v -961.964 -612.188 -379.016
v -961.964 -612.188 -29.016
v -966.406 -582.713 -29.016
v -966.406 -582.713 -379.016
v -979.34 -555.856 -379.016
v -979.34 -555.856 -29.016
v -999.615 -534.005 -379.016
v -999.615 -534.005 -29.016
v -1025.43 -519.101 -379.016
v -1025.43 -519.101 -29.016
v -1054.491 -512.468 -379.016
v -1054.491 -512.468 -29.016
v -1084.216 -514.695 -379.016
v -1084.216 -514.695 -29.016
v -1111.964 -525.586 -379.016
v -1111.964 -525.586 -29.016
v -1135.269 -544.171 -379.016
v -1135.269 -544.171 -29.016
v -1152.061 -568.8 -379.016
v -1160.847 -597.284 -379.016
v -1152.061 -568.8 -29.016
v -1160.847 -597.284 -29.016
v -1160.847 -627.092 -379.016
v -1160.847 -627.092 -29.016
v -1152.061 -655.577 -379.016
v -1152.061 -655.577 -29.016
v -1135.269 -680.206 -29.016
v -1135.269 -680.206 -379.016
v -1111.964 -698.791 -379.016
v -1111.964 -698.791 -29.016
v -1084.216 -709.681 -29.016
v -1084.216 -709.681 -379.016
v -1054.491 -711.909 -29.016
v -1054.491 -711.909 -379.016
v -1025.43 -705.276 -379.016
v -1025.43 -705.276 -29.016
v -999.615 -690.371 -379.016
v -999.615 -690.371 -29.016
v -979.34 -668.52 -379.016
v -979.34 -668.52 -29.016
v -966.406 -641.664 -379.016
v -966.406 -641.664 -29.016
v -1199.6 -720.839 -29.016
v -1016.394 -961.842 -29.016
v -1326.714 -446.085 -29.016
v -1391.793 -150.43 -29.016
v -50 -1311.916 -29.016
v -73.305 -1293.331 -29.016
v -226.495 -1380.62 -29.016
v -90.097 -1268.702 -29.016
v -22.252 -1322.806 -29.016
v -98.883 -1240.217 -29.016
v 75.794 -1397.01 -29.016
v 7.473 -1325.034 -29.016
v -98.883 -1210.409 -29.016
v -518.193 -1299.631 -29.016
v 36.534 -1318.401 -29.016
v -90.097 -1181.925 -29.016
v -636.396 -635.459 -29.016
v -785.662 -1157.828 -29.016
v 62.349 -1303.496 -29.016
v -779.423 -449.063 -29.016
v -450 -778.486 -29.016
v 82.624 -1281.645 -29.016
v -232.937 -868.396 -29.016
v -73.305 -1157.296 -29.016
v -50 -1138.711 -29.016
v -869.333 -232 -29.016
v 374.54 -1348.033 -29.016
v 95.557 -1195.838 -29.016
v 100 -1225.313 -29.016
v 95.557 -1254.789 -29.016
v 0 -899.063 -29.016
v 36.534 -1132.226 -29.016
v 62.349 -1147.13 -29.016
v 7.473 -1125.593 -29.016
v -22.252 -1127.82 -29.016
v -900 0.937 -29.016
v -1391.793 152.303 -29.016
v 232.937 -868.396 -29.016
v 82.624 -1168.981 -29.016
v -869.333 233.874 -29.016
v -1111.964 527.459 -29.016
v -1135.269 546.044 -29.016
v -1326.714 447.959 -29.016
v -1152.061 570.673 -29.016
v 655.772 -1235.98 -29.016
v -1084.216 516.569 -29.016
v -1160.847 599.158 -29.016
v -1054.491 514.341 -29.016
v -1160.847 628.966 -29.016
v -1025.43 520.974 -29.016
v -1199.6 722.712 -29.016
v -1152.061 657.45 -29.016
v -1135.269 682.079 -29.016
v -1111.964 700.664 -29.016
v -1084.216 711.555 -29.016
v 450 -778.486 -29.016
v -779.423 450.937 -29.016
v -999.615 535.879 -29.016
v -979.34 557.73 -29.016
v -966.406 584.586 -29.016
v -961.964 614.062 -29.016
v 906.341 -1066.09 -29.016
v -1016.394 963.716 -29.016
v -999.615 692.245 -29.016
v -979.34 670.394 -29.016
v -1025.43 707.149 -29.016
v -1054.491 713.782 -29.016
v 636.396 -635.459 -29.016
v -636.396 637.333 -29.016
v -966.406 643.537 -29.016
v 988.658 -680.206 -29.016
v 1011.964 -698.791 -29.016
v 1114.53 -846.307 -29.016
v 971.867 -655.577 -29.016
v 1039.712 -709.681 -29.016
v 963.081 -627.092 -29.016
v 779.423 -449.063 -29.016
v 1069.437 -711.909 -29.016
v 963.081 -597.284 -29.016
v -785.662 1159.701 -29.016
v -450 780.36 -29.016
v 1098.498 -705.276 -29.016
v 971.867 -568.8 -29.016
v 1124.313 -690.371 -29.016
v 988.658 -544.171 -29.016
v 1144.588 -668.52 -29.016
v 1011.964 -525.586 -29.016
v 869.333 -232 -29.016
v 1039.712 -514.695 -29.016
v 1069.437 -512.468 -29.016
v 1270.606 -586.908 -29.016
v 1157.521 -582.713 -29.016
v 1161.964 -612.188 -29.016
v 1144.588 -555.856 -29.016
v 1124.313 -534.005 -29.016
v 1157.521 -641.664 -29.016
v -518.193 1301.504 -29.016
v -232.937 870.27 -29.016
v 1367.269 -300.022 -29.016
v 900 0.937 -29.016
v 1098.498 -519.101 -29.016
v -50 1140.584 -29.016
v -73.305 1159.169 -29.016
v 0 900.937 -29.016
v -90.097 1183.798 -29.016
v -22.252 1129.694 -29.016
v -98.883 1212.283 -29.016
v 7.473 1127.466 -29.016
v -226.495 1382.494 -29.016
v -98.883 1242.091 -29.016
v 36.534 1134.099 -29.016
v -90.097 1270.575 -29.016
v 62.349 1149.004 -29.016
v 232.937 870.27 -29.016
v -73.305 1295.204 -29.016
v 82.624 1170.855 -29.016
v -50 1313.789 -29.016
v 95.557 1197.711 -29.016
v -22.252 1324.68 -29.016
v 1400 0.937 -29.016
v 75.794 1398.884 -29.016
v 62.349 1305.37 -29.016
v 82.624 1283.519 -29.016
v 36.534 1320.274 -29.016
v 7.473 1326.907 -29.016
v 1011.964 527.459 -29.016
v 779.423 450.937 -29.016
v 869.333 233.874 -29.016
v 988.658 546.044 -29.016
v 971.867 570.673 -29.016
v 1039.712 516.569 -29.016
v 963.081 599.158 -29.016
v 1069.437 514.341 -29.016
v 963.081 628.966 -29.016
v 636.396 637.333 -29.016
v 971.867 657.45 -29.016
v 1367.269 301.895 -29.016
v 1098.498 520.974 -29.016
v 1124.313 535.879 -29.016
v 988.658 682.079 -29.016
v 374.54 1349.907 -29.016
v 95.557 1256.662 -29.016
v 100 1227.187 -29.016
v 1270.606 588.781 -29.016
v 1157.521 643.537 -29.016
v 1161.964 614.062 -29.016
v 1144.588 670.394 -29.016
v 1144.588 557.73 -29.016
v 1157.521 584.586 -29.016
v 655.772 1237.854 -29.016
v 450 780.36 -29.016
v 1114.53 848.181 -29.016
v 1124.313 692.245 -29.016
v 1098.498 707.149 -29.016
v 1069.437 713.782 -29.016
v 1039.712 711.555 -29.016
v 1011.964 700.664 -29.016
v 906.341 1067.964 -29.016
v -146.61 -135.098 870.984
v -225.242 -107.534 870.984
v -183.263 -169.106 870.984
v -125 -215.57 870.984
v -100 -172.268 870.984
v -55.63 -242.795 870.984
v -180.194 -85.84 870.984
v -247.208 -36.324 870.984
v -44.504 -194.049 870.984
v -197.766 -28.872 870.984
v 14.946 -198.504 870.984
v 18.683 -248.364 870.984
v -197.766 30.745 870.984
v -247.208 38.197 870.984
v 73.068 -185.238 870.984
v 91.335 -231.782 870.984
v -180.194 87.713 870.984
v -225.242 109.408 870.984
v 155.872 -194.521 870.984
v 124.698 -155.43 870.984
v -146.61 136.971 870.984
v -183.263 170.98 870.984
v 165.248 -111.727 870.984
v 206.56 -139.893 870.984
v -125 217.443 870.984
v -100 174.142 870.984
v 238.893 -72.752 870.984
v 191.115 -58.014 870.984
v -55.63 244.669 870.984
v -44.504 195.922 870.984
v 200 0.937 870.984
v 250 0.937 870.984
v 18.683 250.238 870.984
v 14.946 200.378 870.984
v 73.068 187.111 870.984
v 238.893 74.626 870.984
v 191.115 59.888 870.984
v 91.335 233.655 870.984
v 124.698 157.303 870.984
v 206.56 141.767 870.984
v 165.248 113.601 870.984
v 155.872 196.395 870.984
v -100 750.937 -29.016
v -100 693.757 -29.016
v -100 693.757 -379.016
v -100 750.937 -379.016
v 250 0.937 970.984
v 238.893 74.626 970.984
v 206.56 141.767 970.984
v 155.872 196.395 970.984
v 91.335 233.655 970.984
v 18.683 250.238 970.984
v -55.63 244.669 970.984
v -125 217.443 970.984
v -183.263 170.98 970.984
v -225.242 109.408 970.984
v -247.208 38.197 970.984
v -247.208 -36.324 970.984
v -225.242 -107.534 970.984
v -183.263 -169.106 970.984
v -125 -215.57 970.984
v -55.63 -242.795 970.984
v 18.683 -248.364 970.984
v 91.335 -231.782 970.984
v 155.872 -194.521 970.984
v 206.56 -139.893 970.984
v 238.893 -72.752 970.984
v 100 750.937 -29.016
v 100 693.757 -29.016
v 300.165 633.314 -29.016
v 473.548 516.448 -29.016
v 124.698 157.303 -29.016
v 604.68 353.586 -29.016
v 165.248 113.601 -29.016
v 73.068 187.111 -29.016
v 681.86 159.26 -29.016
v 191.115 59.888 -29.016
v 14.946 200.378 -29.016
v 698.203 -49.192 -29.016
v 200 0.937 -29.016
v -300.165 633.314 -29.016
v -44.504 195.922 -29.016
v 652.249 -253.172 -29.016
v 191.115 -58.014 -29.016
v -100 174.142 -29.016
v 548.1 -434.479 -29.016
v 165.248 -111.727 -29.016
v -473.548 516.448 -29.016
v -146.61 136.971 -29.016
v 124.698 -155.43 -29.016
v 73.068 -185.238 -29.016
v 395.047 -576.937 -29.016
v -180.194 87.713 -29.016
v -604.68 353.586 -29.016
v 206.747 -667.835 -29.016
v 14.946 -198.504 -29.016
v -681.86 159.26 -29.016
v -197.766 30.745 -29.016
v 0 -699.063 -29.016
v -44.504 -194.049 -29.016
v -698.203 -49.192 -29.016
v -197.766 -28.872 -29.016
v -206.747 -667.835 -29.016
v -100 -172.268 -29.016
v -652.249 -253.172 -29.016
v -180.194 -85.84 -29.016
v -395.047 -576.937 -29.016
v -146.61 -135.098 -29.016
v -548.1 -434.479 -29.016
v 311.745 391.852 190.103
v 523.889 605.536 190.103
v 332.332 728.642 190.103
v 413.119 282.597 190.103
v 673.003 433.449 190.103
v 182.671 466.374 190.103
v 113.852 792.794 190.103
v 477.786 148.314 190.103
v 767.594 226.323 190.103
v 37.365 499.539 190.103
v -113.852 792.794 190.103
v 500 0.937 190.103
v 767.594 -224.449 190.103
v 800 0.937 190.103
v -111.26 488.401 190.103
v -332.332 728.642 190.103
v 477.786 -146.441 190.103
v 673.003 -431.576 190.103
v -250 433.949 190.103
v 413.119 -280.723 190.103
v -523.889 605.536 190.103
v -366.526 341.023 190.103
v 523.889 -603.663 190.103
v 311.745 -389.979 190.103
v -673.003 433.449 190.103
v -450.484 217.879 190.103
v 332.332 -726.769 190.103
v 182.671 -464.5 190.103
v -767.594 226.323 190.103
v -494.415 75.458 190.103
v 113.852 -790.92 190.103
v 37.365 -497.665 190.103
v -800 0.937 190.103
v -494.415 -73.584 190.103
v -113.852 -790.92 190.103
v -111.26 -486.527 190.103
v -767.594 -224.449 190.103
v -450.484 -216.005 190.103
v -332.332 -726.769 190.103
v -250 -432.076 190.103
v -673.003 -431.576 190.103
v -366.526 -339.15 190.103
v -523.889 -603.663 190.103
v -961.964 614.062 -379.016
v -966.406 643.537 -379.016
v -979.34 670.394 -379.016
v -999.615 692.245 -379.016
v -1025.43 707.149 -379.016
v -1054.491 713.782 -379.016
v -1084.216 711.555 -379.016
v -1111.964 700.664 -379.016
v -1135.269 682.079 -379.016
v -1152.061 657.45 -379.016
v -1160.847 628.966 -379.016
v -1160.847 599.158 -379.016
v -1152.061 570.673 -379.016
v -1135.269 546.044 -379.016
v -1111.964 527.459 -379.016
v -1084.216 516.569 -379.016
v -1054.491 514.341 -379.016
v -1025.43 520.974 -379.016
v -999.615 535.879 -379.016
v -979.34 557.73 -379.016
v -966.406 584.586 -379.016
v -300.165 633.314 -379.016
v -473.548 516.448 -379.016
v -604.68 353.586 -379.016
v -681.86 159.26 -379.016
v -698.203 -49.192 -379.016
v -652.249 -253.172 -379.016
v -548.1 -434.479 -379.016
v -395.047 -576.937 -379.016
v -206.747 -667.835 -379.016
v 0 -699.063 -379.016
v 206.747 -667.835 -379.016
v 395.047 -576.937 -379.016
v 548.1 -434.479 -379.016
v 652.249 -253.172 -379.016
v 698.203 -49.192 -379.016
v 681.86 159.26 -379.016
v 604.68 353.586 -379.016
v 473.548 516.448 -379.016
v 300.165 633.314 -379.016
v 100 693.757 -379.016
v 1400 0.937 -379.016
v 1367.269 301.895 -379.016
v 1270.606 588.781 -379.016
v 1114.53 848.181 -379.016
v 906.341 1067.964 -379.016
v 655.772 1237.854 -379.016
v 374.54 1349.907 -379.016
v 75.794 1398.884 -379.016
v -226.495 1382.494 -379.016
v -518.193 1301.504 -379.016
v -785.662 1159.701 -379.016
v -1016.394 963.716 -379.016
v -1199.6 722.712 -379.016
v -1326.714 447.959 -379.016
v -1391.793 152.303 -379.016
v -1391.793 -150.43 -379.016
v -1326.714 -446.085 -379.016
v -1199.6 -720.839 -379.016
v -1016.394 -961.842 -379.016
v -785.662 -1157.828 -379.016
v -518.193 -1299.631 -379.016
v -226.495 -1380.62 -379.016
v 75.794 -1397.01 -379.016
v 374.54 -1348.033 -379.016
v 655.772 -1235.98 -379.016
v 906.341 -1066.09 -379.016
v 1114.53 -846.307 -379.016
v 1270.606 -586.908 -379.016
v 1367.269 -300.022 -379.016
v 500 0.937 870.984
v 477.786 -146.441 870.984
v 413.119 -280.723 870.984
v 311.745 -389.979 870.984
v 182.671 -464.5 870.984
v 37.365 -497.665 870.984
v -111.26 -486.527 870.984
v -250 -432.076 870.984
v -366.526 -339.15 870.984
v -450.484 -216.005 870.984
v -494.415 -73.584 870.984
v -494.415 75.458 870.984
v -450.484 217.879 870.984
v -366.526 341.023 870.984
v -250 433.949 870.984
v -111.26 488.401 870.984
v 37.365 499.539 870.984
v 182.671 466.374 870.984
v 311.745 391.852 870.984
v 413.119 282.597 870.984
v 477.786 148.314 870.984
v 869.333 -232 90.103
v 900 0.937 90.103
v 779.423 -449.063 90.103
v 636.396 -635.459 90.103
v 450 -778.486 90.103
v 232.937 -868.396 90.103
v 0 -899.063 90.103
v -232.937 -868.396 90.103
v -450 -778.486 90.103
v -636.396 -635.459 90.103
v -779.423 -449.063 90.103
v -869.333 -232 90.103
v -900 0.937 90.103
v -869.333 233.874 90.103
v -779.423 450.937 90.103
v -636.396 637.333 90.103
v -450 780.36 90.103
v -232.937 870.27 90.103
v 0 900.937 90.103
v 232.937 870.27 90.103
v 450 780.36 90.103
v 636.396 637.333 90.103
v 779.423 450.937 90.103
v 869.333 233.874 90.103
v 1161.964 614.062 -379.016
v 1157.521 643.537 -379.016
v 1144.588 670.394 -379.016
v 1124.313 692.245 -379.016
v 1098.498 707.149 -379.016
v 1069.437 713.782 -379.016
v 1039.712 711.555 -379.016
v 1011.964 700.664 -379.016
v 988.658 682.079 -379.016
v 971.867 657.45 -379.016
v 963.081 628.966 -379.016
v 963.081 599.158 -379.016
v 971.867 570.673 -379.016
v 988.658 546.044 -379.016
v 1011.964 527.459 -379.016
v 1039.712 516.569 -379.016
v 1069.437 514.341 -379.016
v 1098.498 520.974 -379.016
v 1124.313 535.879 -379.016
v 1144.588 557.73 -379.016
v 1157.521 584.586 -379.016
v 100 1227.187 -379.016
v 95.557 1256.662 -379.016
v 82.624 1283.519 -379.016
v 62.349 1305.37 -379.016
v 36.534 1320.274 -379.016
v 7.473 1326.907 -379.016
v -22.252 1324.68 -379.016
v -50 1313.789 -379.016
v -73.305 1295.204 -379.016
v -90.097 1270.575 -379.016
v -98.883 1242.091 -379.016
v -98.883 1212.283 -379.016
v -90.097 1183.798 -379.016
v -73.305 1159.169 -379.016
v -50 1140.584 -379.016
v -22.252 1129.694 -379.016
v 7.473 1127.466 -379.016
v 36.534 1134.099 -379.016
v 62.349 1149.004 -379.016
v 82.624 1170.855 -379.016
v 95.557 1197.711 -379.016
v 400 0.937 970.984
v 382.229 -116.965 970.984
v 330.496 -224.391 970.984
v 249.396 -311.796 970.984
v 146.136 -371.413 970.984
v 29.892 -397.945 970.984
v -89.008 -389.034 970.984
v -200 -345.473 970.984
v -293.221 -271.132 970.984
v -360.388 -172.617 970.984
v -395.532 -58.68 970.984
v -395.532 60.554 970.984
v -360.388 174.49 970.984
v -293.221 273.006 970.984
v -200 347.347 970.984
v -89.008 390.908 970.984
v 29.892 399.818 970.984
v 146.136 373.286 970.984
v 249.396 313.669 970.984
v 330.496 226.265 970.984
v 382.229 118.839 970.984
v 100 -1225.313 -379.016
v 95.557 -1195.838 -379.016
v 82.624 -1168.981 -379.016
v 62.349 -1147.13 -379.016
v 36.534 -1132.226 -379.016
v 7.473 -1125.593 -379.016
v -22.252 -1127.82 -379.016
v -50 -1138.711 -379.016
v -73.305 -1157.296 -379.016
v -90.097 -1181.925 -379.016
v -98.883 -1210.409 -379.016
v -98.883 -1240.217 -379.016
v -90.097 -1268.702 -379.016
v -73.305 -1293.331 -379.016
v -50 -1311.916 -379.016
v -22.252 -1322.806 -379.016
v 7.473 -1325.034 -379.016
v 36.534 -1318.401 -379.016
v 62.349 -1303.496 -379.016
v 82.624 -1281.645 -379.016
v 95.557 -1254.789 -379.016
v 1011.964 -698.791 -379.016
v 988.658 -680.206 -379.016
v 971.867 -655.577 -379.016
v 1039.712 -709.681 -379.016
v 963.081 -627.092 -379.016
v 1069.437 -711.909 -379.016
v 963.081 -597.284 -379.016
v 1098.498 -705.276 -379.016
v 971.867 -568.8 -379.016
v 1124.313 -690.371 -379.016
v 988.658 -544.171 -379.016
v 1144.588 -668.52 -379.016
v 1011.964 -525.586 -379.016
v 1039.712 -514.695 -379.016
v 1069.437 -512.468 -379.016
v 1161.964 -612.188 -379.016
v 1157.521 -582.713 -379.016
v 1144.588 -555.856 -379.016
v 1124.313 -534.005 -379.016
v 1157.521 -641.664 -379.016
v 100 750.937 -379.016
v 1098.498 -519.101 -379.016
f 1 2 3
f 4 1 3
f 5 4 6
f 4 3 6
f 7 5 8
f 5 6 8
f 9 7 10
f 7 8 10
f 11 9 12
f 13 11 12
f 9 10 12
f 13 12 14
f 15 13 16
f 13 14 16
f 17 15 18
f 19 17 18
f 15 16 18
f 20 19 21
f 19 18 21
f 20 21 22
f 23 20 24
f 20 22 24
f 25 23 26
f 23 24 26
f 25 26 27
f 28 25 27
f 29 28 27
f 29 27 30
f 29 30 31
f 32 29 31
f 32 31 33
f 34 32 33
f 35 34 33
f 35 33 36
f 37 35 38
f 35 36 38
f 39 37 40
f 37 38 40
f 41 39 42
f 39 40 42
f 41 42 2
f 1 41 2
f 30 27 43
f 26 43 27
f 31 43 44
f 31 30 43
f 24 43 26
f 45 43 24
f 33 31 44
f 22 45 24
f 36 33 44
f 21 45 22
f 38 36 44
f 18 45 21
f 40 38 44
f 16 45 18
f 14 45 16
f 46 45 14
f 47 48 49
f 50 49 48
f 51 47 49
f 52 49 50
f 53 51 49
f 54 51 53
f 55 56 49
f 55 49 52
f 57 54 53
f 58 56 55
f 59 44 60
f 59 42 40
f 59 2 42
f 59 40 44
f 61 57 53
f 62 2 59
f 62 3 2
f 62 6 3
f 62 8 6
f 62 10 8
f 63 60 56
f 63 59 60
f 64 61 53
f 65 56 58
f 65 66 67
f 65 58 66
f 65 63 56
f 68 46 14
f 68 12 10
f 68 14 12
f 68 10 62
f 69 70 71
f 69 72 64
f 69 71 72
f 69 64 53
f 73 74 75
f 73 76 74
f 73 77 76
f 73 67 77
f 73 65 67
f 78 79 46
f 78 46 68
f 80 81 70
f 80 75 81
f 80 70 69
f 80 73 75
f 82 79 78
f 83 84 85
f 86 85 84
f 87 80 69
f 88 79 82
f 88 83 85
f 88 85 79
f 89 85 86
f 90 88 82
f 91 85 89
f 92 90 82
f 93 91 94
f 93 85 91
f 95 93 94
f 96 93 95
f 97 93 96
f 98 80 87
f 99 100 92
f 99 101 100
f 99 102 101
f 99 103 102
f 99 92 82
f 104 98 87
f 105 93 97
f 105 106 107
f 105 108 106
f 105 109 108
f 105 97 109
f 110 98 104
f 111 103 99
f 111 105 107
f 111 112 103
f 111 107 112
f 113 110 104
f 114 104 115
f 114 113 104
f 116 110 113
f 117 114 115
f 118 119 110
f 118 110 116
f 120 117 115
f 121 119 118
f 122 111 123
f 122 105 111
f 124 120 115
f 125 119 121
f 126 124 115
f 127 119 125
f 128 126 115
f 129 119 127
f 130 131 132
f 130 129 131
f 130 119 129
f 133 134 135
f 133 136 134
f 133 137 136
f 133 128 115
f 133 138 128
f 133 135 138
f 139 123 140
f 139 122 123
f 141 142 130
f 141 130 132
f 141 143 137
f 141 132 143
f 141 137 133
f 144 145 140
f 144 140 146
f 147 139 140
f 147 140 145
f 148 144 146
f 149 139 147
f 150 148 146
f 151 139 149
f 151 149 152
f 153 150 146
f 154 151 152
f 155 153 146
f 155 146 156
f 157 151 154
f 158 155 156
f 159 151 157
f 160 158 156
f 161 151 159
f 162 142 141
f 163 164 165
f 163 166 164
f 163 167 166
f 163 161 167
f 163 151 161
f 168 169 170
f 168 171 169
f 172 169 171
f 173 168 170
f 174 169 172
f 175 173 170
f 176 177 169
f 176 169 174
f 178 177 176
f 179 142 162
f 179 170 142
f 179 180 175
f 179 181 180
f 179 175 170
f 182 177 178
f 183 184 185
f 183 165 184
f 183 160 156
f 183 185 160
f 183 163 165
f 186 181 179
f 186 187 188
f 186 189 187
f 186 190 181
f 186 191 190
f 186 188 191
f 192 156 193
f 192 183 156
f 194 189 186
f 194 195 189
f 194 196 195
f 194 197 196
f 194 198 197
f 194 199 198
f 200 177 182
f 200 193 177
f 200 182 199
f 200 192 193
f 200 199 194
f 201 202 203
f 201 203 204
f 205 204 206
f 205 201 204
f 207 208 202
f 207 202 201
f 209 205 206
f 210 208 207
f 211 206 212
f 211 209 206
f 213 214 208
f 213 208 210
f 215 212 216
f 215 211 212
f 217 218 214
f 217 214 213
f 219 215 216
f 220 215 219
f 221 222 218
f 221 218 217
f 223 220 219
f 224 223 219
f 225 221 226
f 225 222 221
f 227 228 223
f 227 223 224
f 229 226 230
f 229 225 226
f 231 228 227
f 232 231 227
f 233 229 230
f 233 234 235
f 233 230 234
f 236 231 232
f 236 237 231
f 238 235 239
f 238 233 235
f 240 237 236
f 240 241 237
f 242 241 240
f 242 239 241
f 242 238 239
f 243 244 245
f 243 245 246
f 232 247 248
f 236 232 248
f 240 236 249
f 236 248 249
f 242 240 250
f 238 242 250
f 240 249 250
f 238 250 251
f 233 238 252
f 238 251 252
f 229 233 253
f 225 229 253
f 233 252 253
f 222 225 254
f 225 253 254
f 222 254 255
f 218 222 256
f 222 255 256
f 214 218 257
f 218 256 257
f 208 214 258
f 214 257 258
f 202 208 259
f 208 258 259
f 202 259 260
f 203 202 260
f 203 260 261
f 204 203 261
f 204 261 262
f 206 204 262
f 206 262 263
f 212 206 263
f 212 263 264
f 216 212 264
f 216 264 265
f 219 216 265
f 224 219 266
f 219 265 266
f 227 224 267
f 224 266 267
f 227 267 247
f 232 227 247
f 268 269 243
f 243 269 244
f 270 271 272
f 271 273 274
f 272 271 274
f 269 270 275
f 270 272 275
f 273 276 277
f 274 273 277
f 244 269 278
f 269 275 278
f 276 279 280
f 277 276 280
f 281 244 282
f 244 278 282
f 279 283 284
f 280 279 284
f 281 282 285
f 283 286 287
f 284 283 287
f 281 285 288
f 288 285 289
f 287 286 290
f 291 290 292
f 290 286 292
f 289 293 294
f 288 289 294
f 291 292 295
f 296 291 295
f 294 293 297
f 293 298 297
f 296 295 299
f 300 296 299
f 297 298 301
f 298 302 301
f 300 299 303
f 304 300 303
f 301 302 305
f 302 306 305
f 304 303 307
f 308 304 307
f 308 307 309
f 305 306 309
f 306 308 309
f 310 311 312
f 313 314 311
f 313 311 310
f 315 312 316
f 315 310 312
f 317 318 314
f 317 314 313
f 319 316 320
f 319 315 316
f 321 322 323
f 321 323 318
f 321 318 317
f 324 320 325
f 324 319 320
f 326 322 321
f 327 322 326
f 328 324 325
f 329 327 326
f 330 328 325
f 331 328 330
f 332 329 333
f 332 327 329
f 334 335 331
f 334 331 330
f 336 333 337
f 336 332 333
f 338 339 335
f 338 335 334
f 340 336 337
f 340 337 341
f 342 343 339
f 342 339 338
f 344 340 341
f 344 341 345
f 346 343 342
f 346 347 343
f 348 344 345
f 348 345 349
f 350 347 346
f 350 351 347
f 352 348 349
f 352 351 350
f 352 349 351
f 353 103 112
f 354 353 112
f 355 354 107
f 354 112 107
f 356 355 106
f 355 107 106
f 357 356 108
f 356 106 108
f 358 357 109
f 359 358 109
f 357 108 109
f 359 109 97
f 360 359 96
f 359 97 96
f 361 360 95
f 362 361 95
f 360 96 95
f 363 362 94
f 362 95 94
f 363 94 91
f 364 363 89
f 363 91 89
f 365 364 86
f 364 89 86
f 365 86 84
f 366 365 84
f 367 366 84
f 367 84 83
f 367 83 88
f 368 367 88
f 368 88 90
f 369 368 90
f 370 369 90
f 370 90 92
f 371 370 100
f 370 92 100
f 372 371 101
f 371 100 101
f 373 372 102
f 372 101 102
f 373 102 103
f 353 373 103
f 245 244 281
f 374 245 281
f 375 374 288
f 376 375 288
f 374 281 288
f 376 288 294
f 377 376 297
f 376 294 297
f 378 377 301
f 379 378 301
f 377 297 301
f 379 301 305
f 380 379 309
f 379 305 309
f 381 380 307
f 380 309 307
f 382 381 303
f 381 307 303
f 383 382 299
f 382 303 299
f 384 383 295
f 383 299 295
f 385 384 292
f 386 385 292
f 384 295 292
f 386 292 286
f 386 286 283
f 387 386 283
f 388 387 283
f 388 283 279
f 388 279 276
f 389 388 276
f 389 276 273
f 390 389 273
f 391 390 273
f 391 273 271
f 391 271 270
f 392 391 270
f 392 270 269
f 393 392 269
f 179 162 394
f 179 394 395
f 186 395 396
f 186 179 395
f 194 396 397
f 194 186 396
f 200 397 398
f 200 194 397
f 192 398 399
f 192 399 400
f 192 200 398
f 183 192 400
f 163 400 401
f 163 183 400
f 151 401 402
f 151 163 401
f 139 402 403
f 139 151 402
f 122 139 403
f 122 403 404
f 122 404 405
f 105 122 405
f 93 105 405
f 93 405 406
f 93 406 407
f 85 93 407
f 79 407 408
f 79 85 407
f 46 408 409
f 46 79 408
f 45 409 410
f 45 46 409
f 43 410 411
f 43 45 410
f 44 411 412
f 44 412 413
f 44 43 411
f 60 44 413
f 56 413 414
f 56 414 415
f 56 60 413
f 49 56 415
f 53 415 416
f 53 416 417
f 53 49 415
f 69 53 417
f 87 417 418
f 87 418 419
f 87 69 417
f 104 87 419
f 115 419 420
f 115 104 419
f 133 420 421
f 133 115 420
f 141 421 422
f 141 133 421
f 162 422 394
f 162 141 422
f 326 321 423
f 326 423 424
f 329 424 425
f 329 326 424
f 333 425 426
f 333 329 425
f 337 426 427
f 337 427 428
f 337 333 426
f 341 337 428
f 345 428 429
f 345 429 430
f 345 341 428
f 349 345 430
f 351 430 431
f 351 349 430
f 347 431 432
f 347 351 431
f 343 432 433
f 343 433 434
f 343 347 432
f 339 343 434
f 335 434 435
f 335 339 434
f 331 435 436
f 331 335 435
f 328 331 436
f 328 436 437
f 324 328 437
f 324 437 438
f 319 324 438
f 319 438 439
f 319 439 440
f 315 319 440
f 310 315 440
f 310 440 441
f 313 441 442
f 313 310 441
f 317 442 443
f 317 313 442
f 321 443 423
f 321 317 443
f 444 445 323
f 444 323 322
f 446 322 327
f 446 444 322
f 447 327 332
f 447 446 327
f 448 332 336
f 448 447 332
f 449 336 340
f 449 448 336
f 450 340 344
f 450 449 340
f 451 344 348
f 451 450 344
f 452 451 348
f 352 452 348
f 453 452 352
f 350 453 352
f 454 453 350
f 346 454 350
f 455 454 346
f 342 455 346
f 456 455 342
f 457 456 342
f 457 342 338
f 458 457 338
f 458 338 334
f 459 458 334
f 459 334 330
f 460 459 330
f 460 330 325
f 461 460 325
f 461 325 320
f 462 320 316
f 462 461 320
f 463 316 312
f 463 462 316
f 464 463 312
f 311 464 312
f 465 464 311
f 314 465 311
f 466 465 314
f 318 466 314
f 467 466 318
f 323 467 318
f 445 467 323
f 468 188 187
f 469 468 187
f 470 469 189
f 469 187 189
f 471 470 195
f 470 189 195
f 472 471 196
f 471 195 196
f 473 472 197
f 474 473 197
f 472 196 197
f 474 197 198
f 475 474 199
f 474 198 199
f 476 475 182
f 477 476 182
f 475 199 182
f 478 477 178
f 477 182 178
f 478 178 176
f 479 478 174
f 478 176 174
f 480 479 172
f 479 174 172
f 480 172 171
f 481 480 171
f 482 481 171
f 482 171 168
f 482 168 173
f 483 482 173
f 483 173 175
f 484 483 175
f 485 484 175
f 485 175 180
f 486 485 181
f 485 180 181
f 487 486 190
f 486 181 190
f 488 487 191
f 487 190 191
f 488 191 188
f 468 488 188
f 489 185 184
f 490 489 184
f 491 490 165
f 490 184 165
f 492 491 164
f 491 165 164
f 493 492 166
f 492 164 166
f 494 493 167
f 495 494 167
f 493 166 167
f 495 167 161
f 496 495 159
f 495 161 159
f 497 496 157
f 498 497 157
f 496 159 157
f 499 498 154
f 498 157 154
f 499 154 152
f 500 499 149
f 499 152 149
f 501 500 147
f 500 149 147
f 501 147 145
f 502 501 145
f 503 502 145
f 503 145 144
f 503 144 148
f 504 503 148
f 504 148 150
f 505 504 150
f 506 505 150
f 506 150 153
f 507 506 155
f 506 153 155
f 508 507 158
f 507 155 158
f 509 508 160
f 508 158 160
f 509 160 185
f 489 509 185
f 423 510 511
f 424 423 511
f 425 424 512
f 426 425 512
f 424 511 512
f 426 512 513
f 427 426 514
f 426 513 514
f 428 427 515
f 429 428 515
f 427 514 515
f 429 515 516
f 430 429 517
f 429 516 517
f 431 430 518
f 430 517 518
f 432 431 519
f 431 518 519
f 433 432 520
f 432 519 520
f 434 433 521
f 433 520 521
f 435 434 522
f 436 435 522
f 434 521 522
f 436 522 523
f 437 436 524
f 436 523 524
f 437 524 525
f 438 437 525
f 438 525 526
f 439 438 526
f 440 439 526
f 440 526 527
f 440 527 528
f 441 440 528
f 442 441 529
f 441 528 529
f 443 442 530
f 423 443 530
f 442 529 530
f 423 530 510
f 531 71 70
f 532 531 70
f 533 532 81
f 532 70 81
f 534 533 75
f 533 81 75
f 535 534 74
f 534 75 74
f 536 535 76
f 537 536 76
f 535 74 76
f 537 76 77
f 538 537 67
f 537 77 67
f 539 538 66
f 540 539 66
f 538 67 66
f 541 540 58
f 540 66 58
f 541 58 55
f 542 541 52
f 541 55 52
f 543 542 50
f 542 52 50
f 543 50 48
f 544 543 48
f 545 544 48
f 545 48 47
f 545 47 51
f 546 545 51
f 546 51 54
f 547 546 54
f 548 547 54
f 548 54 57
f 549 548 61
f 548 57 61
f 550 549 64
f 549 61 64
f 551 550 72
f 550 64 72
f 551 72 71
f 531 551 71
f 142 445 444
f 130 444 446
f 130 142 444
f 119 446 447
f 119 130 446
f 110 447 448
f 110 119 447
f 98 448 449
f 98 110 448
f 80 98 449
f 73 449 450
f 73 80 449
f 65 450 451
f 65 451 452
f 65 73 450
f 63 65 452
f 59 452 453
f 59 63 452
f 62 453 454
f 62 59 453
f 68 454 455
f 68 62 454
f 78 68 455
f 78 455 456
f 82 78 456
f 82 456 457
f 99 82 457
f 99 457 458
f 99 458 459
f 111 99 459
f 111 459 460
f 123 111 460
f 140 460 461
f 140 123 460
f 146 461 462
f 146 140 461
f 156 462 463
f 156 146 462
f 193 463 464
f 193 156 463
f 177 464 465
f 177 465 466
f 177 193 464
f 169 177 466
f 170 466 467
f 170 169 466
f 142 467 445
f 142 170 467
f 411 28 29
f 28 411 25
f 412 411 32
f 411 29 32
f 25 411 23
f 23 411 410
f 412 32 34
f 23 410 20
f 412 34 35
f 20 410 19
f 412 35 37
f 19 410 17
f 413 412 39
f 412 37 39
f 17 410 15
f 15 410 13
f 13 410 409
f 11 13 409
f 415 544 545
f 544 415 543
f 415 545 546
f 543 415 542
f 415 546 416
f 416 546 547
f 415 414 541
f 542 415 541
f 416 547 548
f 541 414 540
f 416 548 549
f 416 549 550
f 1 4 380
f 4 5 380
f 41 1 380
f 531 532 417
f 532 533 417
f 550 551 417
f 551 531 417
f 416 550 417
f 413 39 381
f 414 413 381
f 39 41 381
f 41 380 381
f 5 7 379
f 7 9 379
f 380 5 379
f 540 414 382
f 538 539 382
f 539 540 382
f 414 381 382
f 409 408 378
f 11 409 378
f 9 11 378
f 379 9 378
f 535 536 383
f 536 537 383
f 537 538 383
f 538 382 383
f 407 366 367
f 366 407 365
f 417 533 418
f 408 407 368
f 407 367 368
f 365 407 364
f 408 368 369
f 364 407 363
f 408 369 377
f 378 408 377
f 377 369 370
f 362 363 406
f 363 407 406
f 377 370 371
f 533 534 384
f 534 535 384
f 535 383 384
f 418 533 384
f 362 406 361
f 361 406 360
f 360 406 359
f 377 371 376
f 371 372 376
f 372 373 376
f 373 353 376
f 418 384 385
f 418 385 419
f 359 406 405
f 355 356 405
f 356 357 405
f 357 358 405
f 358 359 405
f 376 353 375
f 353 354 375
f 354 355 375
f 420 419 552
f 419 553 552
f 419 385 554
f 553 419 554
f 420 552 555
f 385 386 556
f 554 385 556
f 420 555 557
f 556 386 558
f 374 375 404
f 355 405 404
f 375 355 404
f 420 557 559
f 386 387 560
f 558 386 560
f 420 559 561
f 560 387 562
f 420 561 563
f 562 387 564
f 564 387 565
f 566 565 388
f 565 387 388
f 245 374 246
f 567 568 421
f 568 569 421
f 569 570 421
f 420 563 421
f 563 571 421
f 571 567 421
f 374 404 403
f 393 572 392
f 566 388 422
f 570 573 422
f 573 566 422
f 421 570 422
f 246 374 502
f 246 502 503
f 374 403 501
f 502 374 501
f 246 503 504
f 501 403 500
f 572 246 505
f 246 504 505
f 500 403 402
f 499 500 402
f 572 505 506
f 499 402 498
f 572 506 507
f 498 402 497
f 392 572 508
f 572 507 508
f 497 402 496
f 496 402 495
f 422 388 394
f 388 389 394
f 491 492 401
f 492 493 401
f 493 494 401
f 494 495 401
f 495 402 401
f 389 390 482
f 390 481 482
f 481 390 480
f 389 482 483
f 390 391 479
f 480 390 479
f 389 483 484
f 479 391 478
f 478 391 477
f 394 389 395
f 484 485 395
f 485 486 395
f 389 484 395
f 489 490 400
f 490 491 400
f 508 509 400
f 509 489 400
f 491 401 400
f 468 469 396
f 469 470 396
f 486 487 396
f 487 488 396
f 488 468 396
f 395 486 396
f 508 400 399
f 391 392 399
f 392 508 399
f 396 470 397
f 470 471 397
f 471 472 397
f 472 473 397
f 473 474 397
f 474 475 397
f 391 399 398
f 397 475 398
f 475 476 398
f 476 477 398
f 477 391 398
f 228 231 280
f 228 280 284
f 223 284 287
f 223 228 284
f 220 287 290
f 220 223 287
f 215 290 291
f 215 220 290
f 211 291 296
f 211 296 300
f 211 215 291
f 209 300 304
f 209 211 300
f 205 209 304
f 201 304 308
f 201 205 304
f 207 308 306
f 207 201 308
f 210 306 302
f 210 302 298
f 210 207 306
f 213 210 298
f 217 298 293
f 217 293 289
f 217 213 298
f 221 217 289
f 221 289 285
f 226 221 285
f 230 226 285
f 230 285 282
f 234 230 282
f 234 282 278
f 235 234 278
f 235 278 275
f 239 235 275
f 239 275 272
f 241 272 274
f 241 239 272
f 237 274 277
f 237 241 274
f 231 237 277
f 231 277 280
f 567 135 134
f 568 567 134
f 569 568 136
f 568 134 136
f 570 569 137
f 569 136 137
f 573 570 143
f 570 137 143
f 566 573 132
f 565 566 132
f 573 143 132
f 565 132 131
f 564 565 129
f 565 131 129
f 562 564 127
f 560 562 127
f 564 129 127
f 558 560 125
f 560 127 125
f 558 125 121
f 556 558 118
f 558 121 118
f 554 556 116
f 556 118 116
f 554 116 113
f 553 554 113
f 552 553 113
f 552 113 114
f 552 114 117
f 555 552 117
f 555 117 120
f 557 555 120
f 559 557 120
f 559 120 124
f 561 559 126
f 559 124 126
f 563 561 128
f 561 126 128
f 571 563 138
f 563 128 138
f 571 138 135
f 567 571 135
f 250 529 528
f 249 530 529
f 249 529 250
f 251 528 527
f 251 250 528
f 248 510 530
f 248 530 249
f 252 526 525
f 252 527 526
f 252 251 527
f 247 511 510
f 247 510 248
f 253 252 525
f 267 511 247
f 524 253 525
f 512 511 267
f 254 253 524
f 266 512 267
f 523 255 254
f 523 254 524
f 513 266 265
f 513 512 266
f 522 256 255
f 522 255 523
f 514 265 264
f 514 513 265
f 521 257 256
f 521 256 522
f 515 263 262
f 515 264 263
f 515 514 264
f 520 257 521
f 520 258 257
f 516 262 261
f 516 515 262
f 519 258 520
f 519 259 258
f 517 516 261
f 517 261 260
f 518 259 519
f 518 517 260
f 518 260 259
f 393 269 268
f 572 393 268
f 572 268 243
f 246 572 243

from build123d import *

# Parameters (mm, degrees)
SKETCH1_R                     = 44
TOWER_SHAFT_DEPTH             = 20
SKETCH2_R                     = 33.091378557
MAIN_HOLE_FOR_PROPSHAFT_DEPTH = 4500
BASE_ATTACHMENT_CHAMFER_SIZE  = 10
SKETCH5_R                     = 140
SKETCH5_R_2                   = 70
BASE_FLANGE_DEPTH             = 35
SKETCH7_R                     = 10
BASE_FLANGE_HOLES_M20_DEPTH   = 35
SKETCH8_W                     = 20
SKETCH8_H                     = 7.035786578
CUT_EXTRUDE1_DEPTH            = 35
SCALE1_SCALE                  = 10
SKETCH9_R                     = 250
SKETCH9_R_2                   = 200
CUT_EXTRUDE2_DEPTH            = 100


with BuildPart() as part:
    # Sketch1 → Tower Shaft (new body)
    with BuildSketch(Plane.XY):
        Circle(SKETCH1_R)
    extrude(amount=TOWER_SHAFT_DEPTH)

    # Sketch2 → Main hole for propshaft (cut)
    with BuildSketch(Plane.XY):
        Circle(SKETCH2_R)
    extrude(amount=MAIN_HOLE_FOR_PROPSHAFT_DEPTH, mode=Mode.SUBTRACT)

    # Sketch3 → Base Attachment Main body (revolve)
    with BuildSketch(Plane(origin=(0, 0, 0), x_dir=(0, 0, -1), z_dir=(1, 0, 0)), mode=Mode.PRIVATE) as base_attachment_main_body_sk:
        Polygon((-21.911955585, 50), (-21.911955585, 90), (0, 90), (0, 50), (0, 20), (-100, 20), (-100, 50), align=None)
    revolve(base_attachment_main_body_sk.sketch.rotate(Axis((0, 0, 4855.714784932), (0, 0, -1)), 90), axis=Axis((0, 0, 4855.714784932), (0, 0, -1)))

    # Base attachment chamfer
    base_attachment_chamfer_edges = [part.edges().sort_by_distance(p)[0] for p in [
        (-50, 0, 100),
        (-90, 0, 21.911955585),
    ]]
    chamfer(base_attachment_chamfer_edges, length=BASE_ATTACHMENT_CHAMFER_SIZE)

    # Sketch5 → Base Flange (add)
    with BuildSketch(Plane.XY):
        Circle(SKETCH5_R)
        Circle(SKETCH5_R_2, mode=Mode.SUBTRACT)
    extrude(amount=-BASE_FLANGE_DEPTH)

    # Sketch7 → Base Flange Holes (M20) (cut)
    with BuildSketch(Plane.XY):
        with Locations((0, 122.625)):
            Circle(SKETCH7_R)
        with Locations((106.196365139, 61.3125)):
            Circle(SKETCH7_R)
        with Locations((106.196365139, -61.3125)):
            Circle(SKETCH7_R)
        with Locations((0, -122.625)):
            Circle(SKETCH7_R)
        with Locations((-106.196365139, -61.3125)):
            Circle(SKETCH7_R)
        with Locations((-106.196365139, 61.3125)):
            Circle(SKETCH7_R)
    extrude(amount=-BASE_FLANGE_HOLES_M20_DEPTH, mode=Mode.SUBTRACT)

    # Sketch8 → Cut-Extrude1 (cut)
    with BuildSketch(Plane(origin=(0, 0, -35), x_dir=(-1, 0, 0), z_dir=(0, 0, -1))):
        with Locations((0, 71.482106711)):
            Rectangle(SKETCH8_W, SKETCH8_H)
    extrude(amount=-CUT_EXTRUDE1_DEPTH, mode=Mode.SUBTRACT)


with BuildPart() as part_1:
    # Scale1: scaled about (0, -0.104082902, 3.224050424)
    add(part.part.scale(SCALE1_SCALE).moved(Location((0, 0.936746118, -29.016453816))))

    # Sketch9 → Cut-Extrude2 (cut)
    with BuildSketch(Plane.XY.offset(970.983546187)):
        with Locations((0, 0.936746116)):
            Circle(SKETCH9_R)
        with Locations((0, 0.936746116)):
            Circle(SKETCH9_R_2, mode=Mode.SUBTRACT)
    extrude(amount=-CUT_EXTRUDE2_DEPTH, mode=Mode.SUBTRACT)


solid = part_1.part
